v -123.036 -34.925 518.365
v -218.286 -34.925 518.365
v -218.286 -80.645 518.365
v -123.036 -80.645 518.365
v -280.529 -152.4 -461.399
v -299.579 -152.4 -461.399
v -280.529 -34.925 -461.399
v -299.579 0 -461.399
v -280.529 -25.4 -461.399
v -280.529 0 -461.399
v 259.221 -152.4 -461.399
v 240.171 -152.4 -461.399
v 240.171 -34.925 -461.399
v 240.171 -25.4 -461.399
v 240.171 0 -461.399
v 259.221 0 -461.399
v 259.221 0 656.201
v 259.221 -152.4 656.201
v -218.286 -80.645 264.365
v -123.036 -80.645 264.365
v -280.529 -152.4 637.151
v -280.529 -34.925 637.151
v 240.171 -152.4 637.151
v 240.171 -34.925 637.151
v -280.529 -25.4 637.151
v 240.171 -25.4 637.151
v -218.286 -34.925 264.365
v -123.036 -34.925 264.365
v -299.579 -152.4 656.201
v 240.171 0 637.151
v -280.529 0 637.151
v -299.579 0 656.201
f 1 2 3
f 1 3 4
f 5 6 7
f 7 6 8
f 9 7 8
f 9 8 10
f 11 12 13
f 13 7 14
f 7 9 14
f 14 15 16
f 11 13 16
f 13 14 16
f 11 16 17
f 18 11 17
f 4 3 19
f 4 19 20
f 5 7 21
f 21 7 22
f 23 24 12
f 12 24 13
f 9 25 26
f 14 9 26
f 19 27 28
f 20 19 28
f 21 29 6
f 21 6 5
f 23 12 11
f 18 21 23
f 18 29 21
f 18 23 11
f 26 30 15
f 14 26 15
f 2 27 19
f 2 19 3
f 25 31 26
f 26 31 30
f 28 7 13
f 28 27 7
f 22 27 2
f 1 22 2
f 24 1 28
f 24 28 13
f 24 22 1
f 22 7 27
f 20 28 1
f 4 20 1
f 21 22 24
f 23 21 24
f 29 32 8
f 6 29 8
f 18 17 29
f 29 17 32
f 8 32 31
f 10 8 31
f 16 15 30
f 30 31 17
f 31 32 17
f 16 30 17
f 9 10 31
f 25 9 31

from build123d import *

# Parameters (mm, degrees)
F1_DEPTH = 152.4
F2_START = 25.4
F0_W     = 520.7
F0_H     = 1098.55
F2_DEPTH = 9.525
F3_W     = 95.25
F3_H     = 254
F4_DEPTH = 45.72


with BuildPart() as f1:
    # F0 (on Front) → F1 (new body)
    with BuildSketch(Plane.XZ):
        Polygon((259.2205437755, 656.2005733788), (-299.5794562245, 656.2005733788), (-299.5794562245, -461.3994266212), (-280.5294562245, -461.3994266212), (-280.5294562245, 637.1505733788), (240.1705437755, 637.1505733788), (240.1705437755, -461.3994266212), (259.2205437755, -461.3994266212), align=None)
    extrude(amount=F1_DEPTH)

    # F0 (on Front) → F2 (join)
    with BuildSketch(Plane.XZ.offset(F2_START)):
        with Locations((-20.1794562245, 87.8755733788)):
            Rectangle(F0_W, F0_H)
    extrude(amount=F2_DEPTH)

    # F3 (on face) → F4 (join)
    with BuildSketch(Plane.XZ.offset(34.925)):
        with Locations((-170.6612408161, 391.3649345023)):
            Rectangle(F3_W, F3_H)
    extrude(amount=F4_DEPTH)


solid = f1.part
